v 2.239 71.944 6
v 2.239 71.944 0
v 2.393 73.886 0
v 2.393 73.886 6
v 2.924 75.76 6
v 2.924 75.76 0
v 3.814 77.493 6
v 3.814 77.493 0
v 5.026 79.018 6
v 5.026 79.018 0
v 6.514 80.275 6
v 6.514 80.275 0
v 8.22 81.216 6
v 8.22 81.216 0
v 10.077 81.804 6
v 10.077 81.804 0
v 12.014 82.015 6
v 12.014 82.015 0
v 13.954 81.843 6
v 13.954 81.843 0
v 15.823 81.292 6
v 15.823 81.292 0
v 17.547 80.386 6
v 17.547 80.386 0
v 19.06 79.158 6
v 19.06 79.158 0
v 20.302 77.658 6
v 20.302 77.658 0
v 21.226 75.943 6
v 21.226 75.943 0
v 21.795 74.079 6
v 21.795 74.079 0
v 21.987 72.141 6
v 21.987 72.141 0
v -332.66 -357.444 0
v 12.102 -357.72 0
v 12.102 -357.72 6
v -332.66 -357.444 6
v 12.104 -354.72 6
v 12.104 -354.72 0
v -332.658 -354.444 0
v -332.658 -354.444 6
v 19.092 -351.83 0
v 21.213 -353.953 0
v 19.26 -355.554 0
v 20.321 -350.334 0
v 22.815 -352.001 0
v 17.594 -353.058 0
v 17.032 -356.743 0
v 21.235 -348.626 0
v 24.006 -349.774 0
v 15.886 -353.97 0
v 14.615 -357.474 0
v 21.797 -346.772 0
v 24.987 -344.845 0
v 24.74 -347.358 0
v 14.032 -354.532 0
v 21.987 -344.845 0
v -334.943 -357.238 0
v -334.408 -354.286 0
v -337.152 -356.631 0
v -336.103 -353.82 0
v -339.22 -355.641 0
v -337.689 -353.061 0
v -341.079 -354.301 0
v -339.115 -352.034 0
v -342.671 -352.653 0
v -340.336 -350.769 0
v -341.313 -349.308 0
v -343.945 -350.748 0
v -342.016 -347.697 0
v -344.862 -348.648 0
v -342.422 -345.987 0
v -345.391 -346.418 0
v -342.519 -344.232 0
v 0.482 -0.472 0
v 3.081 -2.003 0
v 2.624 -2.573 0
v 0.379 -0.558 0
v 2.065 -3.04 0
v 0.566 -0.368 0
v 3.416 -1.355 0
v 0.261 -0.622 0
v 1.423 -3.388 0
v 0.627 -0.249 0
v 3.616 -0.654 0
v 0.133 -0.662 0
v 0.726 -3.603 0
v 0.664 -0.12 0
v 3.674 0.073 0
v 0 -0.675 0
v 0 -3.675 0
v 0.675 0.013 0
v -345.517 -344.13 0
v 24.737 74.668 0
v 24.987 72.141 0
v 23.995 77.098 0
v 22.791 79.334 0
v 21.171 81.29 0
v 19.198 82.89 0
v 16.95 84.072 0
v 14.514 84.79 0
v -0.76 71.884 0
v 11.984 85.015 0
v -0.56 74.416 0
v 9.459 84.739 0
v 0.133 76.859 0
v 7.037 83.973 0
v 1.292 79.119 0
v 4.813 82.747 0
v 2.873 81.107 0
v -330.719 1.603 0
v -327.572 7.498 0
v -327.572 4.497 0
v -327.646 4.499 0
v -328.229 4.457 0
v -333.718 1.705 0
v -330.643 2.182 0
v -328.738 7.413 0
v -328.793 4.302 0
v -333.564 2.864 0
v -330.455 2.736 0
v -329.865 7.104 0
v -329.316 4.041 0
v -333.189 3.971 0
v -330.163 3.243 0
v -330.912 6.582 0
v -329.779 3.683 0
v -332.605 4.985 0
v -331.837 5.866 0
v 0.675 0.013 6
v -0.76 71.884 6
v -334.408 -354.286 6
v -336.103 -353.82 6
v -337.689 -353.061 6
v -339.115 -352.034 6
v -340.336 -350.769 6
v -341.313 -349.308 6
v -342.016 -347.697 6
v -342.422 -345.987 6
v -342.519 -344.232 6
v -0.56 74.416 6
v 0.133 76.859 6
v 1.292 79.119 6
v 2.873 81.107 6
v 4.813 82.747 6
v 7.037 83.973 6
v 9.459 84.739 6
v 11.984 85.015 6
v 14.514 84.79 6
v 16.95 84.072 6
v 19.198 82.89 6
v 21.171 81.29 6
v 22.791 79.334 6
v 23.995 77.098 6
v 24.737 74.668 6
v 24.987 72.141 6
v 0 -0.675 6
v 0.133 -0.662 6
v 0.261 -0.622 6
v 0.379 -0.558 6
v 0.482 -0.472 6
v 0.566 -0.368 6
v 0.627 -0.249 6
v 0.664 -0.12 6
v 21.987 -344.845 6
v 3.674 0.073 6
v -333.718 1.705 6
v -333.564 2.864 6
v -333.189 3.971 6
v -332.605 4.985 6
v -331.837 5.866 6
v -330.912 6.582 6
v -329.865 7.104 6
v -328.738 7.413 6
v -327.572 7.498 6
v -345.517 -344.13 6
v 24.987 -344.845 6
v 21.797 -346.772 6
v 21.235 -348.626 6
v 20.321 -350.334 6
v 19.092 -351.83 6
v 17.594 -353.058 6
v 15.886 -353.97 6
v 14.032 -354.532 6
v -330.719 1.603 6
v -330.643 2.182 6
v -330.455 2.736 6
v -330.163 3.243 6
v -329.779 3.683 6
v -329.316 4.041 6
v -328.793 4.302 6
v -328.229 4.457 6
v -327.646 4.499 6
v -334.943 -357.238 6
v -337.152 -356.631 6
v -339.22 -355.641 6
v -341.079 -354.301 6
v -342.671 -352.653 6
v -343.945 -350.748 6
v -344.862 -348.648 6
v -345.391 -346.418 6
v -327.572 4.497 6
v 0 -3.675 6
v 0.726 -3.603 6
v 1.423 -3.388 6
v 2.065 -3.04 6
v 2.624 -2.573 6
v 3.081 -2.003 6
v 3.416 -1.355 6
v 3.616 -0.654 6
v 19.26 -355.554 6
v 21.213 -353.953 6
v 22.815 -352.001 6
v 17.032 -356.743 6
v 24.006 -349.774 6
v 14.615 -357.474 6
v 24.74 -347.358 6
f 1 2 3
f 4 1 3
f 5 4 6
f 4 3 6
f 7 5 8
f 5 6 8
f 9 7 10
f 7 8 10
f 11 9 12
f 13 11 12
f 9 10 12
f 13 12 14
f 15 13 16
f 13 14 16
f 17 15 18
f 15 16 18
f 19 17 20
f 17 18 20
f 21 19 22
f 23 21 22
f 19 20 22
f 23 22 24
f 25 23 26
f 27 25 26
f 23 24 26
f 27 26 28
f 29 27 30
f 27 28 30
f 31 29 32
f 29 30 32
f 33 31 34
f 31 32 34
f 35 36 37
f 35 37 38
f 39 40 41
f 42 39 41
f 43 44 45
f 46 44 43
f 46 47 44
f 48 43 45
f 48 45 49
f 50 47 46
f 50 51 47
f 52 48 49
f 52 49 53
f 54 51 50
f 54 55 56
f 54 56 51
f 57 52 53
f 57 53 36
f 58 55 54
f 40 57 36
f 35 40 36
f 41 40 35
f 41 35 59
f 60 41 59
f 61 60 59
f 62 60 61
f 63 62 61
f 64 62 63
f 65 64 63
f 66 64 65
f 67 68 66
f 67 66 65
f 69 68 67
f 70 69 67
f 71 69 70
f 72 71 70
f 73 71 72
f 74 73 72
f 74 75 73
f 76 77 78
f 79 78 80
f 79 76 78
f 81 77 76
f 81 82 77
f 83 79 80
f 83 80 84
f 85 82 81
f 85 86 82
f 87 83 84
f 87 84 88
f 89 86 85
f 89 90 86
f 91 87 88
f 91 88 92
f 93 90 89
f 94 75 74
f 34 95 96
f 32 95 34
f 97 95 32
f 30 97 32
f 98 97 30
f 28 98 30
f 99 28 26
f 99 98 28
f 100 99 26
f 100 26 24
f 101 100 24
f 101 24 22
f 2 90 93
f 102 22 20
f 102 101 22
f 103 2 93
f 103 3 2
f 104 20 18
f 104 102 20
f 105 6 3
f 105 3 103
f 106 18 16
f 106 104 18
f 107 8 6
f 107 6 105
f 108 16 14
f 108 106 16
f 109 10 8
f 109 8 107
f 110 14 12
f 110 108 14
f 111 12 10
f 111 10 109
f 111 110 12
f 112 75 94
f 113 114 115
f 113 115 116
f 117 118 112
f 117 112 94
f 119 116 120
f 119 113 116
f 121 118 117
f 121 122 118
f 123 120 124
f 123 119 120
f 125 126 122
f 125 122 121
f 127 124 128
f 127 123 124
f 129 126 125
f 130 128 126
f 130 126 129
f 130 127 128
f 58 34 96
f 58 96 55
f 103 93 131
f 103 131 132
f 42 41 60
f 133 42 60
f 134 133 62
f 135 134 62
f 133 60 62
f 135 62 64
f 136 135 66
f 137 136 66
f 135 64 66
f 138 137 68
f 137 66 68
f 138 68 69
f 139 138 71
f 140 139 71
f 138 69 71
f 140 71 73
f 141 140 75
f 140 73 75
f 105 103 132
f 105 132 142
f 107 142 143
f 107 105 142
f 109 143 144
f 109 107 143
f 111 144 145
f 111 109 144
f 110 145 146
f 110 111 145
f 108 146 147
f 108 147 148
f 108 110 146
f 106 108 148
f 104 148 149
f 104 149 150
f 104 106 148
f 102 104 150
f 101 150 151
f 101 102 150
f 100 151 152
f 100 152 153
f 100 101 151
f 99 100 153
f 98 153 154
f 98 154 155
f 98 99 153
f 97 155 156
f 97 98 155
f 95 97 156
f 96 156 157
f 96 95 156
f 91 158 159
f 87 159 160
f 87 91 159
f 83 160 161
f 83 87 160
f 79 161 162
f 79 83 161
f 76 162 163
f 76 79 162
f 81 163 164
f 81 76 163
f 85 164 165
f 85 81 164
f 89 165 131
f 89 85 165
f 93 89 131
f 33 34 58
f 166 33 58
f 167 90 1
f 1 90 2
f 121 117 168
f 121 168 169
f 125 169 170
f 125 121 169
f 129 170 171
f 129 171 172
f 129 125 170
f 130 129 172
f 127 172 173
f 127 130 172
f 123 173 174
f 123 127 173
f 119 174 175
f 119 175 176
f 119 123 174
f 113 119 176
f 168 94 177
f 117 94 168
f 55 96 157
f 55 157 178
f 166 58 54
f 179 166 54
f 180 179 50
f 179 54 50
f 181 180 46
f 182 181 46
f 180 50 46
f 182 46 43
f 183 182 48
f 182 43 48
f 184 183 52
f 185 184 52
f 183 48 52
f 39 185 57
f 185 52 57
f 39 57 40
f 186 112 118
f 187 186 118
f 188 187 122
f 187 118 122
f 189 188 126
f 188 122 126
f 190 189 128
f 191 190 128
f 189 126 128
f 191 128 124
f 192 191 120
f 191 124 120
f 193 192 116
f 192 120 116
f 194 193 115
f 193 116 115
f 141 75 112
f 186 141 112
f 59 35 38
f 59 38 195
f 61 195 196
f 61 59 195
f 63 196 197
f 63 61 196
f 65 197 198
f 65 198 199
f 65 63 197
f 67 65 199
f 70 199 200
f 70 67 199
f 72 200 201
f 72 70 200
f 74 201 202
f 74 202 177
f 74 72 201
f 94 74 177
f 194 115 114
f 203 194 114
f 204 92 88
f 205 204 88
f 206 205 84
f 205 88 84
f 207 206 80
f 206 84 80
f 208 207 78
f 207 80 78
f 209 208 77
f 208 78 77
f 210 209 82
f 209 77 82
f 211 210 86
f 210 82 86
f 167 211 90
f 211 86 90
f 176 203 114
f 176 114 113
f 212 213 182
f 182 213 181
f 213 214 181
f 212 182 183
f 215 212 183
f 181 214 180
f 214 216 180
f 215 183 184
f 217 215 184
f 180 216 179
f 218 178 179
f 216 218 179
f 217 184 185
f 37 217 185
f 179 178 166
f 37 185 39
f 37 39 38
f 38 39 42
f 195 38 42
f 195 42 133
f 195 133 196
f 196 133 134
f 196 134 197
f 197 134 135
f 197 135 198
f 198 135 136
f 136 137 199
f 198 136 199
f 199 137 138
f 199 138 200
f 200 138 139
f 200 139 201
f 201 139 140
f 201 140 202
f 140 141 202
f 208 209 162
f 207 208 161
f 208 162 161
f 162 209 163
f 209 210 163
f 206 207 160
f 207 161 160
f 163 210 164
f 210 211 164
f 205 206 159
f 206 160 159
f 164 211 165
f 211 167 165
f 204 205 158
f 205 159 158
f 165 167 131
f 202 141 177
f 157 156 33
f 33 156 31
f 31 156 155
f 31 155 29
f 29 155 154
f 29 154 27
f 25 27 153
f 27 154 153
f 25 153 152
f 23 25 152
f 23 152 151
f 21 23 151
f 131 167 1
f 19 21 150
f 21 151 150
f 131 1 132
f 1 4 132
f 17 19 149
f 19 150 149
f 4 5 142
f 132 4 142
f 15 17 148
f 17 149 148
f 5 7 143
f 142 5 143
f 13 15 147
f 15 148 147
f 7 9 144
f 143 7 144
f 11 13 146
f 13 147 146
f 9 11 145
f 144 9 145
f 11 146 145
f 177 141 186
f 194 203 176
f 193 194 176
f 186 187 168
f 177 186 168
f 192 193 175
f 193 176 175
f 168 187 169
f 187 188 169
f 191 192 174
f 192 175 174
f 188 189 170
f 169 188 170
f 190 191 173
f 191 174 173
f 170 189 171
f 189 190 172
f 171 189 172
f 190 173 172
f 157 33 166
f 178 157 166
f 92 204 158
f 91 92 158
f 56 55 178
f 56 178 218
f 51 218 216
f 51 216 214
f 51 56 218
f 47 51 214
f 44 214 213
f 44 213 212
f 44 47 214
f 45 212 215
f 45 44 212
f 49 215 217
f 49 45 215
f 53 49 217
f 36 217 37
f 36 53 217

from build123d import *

# Parameters (mm, degrees)
EXTRUDE_THIN1_DEPTH = 6
SKETCH3_W           = 327.571594818
SKETCH3_H           = 11.174496413
CUT_EXTRUDE3_DEPTH  = 498.380052114


with BuildPart() as part:
    # Sketch2 → Extrude-Thin1 (new body)
    with BuildSketch(Plane.XY):
        with BuildLine():
            Line((-327.571523016, 7.498350769), (-0.016837352, -0.67478997))
            ThreePointArc((-0.016837352, -0.67478997), (0.476106699, -0.478484494), (0.674865476, 0.013475489))
            Line((0.674865476, 0.013475489), (-0.760216383, 71.883759331))
            ThreePointArc((-0.760216383, 71.883759331), (11.983695064, 85.015150307), (24.987217703, 72.140791802))
            Line((24.987217703, 72.140791802), (24.987217703, -344.844919852))
            ThreePointArc((24.987217703, -344.844919852), (21.212571133, -353.952564578), (12.101906255, -357.719915723))
            Line((12.101906255, -357.719915723), (-332.660093745, -357.443799484))
            ThreePointArc((-332.660093745, -357.443799484), (-341.911283403, -353.512528914), (-345.517294817, -344.129774518))
            Line((-345.517294817, -344.129774518), (-333.717699052, 1.704813786))
            ThreePointArc((-333.717699052, 1.704813786), (-331.836728158, 5.866260785), (-327.571523016, 7.498350769))
        make_face()
        with BuildLine():
            Line((-327.646355689, 4.499284236), (-0.091670025, -3.673856503))
            ThreePointArc((-0.091670025, -3.673856503), (2.592136472, -2.605082247), (3.674267594, 0.07336655))
            Line((3.674267594, 0.07336655), (2.239185734, 71.943650392))
            ThreePointArc((2.239185734, 71.943650392), (12.013642086, 82.015299782), (21.987217703, 72.140791802))
            Line((21.987217703, 72.140791802), (21.987217703, -344.844919852))
            ThreePointArc((21.987217703, -344.844919852), (19.092100431, -351.830394933), (12.104308922, -354.719916685))
            Line((12.104308922, -354.719916685), (-332.657691078, -354.443800446))
            ThreePointArc((-332.657691078, -354.443800446), (-339.753263728, -351.428554087), (-342.519039473, -344.23207256))
            Line((-342.519039473, -344.23207256), (-330.719443707, 1.602515744))
            ThreePointArc((-330.719443707, 1.602515744), (-329.778958261, 3.683239244), (-327.646355689, 4.499284236))
        make_face(mode=Mode.SUBTRACT)
    extrude(amount=EXTRUDE_THIN1_DEPTH)

    # Sketch3 → Cut-Extrude3 (cut, through all)
    with BuildSketch(Plane.XY):
        with Locations((-163.785725607, 1.911102563)):
            Rectangle(SKETCH3_W, SKETCH3_H)
    extrude(amount=CUT_EXTRUDE3_DEPTH, mode=Mode.SUBTRACT)


solid = part.part
